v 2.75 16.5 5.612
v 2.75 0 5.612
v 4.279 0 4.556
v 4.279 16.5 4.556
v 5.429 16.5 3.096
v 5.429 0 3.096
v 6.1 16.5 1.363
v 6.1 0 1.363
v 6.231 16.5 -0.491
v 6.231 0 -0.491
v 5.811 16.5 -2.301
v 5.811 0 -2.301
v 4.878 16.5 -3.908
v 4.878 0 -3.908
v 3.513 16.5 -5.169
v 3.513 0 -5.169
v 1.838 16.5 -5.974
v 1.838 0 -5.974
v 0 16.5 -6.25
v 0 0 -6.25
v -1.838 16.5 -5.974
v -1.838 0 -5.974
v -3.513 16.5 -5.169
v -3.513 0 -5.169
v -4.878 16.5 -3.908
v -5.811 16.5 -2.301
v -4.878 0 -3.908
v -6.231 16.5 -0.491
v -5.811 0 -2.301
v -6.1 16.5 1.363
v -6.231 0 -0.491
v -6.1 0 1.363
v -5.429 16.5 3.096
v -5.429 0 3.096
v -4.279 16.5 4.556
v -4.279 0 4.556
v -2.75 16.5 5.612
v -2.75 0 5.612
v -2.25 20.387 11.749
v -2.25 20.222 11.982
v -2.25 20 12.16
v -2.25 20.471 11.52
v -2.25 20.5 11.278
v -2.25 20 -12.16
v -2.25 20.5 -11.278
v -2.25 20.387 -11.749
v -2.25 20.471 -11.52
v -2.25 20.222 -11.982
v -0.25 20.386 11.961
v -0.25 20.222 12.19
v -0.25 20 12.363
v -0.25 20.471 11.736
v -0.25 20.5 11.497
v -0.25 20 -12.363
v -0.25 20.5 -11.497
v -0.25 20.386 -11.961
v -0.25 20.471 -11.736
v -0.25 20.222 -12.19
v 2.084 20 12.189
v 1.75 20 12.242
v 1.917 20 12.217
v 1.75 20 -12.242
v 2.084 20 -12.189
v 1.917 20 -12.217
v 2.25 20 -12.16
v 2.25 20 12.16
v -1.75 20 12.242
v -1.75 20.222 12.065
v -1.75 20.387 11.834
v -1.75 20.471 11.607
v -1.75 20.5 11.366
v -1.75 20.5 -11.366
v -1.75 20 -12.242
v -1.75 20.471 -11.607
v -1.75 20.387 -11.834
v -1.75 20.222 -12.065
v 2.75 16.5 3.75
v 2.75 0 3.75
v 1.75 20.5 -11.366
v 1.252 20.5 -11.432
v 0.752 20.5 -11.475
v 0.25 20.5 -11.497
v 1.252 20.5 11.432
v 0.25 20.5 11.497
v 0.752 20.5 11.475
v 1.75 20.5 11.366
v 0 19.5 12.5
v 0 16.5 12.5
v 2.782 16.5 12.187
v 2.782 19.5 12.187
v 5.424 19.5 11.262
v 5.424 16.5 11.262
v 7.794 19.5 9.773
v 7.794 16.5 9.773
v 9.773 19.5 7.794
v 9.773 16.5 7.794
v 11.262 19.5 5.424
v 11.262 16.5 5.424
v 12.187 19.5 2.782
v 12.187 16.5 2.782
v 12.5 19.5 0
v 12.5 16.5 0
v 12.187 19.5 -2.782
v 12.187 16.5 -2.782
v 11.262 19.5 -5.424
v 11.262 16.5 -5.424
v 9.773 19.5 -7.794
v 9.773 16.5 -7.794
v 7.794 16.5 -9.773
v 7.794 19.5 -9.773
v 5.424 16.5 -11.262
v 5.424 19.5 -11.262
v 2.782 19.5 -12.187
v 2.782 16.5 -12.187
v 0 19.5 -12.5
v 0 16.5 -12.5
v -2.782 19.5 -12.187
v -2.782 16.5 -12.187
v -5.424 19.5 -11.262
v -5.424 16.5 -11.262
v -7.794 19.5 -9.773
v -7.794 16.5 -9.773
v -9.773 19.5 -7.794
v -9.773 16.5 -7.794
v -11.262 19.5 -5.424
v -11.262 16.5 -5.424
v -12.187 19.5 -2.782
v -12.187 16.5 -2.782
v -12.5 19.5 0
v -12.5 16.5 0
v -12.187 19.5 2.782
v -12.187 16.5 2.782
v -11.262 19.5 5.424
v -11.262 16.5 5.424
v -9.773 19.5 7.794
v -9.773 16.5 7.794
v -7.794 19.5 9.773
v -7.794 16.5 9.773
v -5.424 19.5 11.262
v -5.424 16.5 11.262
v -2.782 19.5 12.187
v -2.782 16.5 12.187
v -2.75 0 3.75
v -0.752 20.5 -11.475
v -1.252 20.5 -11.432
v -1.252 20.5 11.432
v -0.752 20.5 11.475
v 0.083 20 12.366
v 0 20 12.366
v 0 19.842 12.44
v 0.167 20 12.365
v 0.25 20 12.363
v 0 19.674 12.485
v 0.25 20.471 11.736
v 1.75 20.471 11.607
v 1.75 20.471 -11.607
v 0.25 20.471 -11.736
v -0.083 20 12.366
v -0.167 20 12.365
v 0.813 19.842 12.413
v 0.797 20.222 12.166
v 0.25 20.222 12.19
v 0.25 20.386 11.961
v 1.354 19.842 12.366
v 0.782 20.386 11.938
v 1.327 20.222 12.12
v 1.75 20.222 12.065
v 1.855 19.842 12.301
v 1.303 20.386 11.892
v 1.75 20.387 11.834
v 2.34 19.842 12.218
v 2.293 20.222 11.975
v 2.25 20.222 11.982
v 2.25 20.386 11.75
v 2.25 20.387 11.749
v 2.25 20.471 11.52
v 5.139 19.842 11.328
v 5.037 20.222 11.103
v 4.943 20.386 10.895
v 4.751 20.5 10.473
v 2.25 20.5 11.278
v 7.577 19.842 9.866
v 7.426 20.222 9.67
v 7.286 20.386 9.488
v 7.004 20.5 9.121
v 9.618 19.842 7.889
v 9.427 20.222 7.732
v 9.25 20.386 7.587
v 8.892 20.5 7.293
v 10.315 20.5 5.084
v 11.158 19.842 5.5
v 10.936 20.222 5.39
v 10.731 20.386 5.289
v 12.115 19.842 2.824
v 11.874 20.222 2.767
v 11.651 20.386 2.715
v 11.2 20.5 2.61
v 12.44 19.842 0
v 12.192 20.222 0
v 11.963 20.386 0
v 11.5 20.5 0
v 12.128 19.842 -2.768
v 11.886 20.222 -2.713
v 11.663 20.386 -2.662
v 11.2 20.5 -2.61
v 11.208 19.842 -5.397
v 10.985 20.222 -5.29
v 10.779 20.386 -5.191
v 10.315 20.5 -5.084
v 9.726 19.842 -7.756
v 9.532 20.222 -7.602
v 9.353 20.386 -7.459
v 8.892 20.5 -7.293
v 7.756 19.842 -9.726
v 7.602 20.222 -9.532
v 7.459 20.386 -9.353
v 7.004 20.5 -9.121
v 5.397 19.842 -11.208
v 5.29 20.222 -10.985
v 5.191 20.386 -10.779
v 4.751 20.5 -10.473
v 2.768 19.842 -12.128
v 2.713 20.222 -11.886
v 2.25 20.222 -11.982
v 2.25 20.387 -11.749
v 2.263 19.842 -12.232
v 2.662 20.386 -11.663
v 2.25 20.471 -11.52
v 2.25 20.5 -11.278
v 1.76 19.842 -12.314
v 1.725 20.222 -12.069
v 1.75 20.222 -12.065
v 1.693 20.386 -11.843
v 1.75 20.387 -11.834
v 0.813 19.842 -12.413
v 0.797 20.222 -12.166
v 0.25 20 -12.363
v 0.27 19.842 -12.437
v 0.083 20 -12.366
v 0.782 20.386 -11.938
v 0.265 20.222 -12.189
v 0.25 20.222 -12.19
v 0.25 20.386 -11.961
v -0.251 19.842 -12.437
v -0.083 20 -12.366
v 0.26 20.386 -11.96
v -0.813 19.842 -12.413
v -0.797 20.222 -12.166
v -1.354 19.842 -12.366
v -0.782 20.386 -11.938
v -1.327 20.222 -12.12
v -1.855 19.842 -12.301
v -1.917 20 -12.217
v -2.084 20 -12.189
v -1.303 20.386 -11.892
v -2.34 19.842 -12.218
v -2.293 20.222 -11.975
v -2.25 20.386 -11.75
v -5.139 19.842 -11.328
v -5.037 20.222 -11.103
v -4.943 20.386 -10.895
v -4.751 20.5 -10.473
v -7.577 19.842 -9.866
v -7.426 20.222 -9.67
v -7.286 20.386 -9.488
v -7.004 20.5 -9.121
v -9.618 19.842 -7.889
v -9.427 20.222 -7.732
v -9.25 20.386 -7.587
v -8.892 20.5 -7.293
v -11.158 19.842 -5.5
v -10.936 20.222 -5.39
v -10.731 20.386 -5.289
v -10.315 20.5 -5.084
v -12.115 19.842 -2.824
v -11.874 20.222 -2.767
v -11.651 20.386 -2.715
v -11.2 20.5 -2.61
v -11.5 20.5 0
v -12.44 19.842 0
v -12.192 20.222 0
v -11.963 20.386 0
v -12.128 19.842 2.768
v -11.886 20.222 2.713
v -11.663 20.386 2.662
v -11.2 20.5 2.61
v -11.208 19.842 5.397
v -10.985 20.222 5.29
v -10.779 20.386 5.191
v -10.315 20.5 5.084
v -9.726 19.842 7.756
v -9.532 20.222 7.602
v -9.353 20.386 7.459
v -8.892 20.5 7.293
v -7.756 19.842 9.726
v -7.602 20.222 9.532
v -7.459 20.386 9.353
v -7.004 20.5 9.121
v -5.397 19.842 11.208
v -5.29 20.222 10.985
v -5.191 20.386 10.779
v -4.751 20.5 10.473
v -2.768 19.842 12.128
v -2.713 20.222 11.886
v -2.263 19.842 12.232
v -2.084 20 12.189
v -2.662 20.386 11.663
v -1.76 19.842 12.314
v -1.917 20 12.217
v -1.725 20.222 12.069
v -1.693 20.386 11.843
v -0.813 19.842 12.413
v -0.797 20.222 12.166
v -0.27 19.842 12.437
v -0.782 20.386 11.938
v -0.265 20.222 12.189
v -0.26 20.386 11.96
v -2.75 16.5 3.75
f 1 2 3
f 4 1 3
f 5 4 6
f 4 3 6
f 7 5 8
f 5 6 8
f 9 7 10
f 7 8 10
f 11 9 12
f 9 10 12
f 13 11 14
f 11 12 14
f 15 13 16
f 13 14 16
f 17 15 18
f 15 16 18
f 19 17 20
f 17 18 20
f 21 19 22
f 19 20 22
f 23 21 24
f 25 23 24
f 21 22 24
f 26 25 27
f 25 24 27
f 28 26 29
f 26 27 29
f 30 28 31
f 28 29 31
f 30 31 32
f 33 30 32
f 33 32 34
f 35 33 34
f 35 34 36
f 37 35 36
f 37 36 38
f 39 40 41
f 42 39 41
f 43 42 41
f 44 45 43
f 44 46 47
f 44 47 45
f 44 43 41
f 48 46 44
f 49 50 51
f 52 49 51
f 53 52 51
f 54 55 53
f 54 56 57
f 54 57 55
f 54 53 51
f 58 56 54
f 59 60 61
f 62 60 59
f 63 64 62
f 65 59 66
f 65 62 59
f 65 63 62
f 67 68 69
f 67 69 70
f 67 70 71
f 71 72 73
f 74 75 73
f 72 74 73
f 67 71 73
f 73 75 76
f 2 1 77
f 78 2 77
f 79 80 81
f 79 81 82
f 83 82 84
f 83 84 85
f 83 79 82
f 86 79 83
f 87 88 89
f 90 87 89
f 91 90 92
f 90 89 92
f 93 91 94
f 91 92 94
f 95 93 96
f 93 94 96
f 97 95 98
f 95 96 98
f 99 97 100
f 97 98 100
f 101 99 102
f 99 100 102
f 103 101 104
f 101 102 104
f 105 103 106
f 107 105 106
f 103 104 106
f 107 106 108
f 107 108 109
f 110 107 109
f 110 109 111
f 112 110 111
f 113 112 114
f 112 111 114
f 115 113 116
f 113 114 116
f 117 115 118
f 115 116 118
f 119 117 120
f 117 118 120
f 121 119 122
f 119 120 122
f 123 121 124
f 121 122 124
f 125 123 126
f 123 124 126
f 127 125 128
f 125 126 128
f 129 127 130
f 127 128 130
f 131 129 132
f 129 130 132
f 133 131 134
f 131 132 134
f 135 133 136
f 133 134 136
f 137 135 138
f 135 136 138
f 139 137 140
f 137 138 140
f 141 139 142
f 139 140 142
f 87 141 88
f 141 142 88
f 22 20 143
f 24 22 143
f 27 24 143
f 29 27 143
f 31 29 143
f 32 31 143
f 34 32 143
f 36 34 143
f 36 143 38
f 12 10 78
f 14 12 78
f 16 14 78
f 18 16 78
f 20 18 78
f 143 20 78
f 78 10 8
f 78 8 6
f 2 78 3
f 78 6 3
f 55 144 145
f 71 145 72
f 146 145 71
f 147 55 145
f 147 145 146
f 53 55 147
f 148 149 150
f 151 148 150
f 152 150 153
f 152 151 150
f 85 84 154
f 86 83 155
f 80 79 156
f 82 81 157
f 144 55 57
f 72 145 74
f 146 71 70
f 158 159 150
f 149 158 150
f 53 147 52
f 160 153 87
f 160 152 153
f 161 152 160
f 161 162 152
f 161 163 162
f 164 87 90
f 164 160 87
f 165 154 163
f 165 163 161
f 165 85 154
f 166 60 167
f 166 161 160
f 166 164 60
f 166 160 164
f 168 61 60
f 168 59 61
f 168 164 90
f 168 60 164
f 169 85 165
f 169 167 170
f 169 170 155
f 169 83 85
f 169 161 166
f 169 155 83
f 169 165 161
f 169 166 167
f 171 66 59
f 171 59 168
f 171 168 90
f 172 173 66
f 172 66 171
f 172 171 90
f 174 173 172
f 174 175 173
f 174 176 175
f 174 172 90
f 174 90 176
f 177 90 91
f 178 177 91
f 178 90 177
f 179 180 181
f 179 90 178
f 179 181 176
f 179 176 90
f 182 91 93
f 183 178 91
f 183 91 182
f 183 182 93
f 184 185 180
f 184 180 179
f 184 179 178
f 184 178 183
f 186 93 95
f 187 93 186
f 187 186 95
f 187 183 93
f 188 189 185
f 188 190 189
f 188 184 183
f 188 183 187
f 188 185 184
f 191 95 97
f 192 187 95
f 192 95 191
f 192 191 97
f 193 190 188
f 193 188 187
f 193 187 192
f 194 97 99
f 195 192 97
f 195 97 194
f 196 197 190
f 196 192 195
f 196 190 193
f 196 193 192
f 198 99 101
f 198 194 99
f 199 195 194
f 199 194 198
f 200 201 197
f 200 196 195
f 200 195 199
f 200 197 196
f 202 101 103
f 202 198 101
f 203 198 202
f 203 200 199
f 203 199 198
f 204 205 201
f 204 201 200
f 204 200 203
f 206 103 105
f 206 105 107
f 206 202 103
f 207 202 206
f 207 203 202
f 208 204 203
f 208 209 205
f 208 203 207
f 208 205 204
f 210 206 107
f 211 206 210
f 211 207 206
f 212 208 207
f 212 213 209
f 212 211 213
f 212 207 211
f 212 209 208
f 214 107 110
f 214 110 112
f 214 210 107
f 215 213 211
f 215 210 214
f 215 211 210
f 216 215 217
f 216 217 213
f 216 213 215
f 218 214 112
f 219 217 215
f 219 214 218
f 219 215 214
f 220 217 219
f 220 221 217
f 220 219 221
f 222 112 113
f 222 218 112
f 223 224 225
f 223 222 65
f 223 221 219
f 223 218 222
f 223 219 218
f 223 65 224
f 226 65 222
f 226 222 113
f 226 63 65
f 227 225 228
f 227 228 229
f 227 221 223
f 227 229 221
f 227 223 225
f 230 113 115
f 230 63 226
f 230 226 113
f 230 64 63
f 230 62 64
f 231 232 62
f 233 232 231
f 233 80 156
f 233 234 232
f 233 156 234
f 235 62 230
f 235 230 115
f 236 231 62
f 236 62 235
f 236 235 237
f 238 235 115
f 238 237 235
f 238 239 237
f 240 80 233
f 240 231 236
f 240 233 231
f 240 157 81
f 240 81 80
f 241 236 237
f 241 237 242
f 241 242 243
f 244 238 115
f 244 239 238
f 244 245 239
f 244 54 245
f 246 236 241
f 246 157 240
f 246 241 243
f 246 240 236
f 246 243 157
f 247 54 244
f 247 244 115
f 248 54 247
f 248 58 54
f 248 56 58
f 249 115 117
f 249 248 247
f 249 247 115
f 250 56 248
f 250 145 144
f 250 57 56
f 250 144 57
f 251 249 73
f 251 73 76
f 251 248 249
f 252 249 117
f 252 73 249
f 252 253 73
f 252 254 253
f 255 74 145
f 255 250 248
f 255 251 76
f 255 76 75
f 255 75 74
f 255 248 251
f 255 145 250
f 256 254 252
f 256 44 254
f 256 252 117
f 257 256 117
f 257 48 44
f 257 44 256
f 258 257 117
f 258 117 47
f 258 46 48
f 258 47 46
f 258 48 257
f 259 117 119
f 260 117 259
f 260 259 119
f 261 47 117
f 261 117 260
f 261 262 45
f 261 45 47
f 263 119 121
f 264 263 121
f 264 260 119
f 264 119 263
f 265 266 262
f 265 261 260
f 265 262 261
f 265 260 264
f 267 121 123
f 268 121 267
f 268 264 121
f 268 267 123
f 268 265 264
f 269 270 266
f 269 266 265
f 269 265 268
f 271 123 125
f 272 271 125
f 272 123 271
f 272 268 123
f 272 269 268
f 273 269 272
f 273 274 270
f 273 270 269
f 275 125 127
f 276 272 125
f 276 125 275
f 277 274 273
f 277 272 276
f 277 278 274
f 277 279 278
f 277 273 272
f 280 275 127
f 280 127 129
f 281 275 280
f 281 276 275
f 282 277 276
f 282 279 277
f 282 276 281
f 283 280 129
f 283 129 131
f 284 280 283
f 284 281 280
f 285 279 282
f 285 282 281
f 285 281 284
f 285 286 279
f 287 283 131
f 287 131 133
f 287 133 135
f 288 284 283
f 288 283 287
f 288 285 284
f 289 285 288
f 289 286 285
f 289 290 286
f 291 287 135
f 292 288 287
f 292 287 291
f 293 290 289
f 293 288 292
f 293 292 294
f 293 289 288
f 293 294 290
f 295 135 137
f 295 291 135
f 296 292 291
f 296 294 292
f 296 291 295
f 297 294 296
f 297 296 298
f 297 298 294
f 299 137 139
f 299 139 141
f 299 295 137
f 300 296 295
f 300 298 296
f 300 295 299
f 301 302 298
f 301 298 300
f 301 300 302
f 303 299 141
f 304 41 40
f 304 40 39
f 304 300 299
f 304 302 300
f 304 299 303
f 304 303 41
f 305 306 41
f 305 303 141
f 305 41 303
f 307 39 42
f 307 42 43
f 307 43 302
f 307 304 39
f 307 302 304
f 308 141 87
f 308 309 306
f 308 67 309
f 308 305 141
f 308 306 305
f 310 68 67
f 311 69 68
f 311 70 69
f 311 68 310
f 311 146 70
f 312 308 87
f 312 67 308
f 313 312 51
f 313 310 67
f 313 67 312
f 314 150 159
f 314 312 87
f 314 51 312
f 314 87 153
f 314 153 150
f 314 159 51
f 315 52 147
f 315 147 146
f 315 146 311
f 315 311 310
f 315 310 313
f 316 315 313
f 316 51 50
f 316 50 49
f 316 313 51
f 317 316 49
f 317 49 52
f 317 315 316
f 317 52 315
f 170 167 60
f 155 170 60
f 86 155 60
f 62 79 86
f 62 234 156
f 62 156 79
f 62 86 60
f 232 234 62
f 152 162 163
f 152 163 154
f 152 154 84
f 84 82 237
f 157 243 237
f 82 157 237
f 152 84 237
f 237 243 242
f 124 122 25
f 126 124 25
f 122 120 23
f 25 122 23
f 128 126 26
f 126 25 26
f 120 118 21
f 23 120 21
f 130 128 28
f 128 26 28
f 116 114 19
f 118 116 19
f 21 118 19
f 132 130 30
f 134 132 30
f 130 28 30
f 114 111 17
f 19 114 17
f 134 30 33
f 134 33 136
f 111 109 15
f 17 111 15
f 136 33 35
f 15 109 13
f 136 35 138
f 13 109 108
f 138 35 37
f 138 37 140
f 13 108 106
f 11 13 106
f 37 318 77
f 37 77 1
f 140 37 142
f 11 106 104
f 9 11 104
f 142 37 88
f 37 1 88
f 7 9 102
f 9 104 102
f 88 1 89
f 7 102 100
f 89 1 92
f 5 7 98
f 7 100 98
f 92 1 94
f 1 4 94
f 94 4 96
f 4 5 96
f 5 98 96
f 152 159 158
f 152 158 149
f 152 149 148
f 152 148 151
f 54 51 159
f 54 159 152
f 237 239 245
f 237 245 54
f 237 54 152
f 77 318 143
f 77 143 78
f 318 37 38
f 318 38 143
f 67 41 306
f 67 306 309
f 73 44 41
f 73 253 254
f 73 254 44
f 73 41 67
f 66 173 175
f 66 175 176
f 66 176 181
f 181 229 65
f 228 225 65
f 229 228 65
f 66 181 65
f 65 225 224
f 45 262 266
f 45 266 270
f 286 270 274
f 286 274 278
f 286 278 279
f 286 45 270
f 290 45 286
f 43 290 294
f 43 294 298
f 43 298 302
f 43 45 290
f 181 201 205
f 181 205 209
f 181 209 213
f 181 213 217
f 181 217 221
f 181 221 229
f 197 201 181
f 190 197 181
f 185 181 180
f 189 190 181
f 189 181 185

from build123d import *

# Parameters (mm, degrees)
SKETCH1_R           = 6.25
BOSS_EXTRUDE1_DEPTH = 16.5
CUT_EXTRUDE1_REACH  = 20.718
SKETCH2_W           = 5.5
SKETCH2_H           = 5.5
SKETCH3_R           = 12.5
BOSS_EXTRUDE2_DEPTH = 4
FILLET1_R           = 1
SKETCH4_W           = 0.5
SKETCH4_H           = 30
CUT_EXTRUDE2_DEPTH  = 0.5


with BuildPart() as part:
    # Sketch1 → Boss-Extrude1 (new body)
    with BuildSketch(Plane(origin=(0, 0, 0), x_dir=(1, 0, 0), z_dir=(0, 1, 0))):
        with Locations(Location((0, 0, 0), (0, 0, 270))):
            Circle(SKETCH1_R)
    extrude(amount=BOSS_EXTRUDE1_DEPTH)

    # Sketch2 → Cut-Extrude1 (cut, up to next)
    with BuildSketch(Plane(origin=(0, 16.5, 0), x_dir=(1, 0, 0), z_dir=(0, 1, 0)), mode=Mode.PRIVATE) as cut_extrude1_sk1:
        with Locations((0, -6.5)):
            Rectangle(SKETCH2_W, SKETCH2_H)
    cut_extrude1_tool1 = extrude(cut_extrude1_sk1.sketch, amount=-CUT_EXTRUDE1_REACH, mode=Mode.PRIVATE) & part.part
    add(cut_extrude1_tool1.solids().sort_by_distance((0, 16.5, 6.5))[0], mode=Mode.SUBTRACT)

    # Sketch3 → Boss-Extrude2 (add)
    with BuildSketch(Plane(origin=(0, 16.5, 0), x_dir=(1, 0, 0), z_dir=(0, 1, 0))):
        with Locations(Location((0, 0, 0), (0, 0, 270))):
            Circle(SKETCH3_R)
    extrude(amount=BOSS_EXTRUDE2_DEPTH)

    # Fillet1
    fillet1_edges = [part.edges().sort_by_distance(p)[0] for p in [
        (0, 20.5, -12.5),
    ]]
    fillet(fillet1_edges, radius=FILLET1_R)

    # Sketch4 → Cut-Extrude2 (cut)
    with BuildSketch(Plane(origin=(0, 20.5, 0), x_dir=(1, 0, 0), z_dir=(0, 1, 0))):
        Rectangle(SKETCH4_W, SKETCH4_H)
        with Locations((2, 0)):
            Rectangle(SKETCH4_W, SKETCH4_H)
        with Locations((-2, 0)):
            Rectangle(SKETCH4_W, SKETCH4_H)
    extrude(amount=-CUT_EXTRUDE2_DEPTH, mode=Mode.SUBTRACT)


solid = part.part
